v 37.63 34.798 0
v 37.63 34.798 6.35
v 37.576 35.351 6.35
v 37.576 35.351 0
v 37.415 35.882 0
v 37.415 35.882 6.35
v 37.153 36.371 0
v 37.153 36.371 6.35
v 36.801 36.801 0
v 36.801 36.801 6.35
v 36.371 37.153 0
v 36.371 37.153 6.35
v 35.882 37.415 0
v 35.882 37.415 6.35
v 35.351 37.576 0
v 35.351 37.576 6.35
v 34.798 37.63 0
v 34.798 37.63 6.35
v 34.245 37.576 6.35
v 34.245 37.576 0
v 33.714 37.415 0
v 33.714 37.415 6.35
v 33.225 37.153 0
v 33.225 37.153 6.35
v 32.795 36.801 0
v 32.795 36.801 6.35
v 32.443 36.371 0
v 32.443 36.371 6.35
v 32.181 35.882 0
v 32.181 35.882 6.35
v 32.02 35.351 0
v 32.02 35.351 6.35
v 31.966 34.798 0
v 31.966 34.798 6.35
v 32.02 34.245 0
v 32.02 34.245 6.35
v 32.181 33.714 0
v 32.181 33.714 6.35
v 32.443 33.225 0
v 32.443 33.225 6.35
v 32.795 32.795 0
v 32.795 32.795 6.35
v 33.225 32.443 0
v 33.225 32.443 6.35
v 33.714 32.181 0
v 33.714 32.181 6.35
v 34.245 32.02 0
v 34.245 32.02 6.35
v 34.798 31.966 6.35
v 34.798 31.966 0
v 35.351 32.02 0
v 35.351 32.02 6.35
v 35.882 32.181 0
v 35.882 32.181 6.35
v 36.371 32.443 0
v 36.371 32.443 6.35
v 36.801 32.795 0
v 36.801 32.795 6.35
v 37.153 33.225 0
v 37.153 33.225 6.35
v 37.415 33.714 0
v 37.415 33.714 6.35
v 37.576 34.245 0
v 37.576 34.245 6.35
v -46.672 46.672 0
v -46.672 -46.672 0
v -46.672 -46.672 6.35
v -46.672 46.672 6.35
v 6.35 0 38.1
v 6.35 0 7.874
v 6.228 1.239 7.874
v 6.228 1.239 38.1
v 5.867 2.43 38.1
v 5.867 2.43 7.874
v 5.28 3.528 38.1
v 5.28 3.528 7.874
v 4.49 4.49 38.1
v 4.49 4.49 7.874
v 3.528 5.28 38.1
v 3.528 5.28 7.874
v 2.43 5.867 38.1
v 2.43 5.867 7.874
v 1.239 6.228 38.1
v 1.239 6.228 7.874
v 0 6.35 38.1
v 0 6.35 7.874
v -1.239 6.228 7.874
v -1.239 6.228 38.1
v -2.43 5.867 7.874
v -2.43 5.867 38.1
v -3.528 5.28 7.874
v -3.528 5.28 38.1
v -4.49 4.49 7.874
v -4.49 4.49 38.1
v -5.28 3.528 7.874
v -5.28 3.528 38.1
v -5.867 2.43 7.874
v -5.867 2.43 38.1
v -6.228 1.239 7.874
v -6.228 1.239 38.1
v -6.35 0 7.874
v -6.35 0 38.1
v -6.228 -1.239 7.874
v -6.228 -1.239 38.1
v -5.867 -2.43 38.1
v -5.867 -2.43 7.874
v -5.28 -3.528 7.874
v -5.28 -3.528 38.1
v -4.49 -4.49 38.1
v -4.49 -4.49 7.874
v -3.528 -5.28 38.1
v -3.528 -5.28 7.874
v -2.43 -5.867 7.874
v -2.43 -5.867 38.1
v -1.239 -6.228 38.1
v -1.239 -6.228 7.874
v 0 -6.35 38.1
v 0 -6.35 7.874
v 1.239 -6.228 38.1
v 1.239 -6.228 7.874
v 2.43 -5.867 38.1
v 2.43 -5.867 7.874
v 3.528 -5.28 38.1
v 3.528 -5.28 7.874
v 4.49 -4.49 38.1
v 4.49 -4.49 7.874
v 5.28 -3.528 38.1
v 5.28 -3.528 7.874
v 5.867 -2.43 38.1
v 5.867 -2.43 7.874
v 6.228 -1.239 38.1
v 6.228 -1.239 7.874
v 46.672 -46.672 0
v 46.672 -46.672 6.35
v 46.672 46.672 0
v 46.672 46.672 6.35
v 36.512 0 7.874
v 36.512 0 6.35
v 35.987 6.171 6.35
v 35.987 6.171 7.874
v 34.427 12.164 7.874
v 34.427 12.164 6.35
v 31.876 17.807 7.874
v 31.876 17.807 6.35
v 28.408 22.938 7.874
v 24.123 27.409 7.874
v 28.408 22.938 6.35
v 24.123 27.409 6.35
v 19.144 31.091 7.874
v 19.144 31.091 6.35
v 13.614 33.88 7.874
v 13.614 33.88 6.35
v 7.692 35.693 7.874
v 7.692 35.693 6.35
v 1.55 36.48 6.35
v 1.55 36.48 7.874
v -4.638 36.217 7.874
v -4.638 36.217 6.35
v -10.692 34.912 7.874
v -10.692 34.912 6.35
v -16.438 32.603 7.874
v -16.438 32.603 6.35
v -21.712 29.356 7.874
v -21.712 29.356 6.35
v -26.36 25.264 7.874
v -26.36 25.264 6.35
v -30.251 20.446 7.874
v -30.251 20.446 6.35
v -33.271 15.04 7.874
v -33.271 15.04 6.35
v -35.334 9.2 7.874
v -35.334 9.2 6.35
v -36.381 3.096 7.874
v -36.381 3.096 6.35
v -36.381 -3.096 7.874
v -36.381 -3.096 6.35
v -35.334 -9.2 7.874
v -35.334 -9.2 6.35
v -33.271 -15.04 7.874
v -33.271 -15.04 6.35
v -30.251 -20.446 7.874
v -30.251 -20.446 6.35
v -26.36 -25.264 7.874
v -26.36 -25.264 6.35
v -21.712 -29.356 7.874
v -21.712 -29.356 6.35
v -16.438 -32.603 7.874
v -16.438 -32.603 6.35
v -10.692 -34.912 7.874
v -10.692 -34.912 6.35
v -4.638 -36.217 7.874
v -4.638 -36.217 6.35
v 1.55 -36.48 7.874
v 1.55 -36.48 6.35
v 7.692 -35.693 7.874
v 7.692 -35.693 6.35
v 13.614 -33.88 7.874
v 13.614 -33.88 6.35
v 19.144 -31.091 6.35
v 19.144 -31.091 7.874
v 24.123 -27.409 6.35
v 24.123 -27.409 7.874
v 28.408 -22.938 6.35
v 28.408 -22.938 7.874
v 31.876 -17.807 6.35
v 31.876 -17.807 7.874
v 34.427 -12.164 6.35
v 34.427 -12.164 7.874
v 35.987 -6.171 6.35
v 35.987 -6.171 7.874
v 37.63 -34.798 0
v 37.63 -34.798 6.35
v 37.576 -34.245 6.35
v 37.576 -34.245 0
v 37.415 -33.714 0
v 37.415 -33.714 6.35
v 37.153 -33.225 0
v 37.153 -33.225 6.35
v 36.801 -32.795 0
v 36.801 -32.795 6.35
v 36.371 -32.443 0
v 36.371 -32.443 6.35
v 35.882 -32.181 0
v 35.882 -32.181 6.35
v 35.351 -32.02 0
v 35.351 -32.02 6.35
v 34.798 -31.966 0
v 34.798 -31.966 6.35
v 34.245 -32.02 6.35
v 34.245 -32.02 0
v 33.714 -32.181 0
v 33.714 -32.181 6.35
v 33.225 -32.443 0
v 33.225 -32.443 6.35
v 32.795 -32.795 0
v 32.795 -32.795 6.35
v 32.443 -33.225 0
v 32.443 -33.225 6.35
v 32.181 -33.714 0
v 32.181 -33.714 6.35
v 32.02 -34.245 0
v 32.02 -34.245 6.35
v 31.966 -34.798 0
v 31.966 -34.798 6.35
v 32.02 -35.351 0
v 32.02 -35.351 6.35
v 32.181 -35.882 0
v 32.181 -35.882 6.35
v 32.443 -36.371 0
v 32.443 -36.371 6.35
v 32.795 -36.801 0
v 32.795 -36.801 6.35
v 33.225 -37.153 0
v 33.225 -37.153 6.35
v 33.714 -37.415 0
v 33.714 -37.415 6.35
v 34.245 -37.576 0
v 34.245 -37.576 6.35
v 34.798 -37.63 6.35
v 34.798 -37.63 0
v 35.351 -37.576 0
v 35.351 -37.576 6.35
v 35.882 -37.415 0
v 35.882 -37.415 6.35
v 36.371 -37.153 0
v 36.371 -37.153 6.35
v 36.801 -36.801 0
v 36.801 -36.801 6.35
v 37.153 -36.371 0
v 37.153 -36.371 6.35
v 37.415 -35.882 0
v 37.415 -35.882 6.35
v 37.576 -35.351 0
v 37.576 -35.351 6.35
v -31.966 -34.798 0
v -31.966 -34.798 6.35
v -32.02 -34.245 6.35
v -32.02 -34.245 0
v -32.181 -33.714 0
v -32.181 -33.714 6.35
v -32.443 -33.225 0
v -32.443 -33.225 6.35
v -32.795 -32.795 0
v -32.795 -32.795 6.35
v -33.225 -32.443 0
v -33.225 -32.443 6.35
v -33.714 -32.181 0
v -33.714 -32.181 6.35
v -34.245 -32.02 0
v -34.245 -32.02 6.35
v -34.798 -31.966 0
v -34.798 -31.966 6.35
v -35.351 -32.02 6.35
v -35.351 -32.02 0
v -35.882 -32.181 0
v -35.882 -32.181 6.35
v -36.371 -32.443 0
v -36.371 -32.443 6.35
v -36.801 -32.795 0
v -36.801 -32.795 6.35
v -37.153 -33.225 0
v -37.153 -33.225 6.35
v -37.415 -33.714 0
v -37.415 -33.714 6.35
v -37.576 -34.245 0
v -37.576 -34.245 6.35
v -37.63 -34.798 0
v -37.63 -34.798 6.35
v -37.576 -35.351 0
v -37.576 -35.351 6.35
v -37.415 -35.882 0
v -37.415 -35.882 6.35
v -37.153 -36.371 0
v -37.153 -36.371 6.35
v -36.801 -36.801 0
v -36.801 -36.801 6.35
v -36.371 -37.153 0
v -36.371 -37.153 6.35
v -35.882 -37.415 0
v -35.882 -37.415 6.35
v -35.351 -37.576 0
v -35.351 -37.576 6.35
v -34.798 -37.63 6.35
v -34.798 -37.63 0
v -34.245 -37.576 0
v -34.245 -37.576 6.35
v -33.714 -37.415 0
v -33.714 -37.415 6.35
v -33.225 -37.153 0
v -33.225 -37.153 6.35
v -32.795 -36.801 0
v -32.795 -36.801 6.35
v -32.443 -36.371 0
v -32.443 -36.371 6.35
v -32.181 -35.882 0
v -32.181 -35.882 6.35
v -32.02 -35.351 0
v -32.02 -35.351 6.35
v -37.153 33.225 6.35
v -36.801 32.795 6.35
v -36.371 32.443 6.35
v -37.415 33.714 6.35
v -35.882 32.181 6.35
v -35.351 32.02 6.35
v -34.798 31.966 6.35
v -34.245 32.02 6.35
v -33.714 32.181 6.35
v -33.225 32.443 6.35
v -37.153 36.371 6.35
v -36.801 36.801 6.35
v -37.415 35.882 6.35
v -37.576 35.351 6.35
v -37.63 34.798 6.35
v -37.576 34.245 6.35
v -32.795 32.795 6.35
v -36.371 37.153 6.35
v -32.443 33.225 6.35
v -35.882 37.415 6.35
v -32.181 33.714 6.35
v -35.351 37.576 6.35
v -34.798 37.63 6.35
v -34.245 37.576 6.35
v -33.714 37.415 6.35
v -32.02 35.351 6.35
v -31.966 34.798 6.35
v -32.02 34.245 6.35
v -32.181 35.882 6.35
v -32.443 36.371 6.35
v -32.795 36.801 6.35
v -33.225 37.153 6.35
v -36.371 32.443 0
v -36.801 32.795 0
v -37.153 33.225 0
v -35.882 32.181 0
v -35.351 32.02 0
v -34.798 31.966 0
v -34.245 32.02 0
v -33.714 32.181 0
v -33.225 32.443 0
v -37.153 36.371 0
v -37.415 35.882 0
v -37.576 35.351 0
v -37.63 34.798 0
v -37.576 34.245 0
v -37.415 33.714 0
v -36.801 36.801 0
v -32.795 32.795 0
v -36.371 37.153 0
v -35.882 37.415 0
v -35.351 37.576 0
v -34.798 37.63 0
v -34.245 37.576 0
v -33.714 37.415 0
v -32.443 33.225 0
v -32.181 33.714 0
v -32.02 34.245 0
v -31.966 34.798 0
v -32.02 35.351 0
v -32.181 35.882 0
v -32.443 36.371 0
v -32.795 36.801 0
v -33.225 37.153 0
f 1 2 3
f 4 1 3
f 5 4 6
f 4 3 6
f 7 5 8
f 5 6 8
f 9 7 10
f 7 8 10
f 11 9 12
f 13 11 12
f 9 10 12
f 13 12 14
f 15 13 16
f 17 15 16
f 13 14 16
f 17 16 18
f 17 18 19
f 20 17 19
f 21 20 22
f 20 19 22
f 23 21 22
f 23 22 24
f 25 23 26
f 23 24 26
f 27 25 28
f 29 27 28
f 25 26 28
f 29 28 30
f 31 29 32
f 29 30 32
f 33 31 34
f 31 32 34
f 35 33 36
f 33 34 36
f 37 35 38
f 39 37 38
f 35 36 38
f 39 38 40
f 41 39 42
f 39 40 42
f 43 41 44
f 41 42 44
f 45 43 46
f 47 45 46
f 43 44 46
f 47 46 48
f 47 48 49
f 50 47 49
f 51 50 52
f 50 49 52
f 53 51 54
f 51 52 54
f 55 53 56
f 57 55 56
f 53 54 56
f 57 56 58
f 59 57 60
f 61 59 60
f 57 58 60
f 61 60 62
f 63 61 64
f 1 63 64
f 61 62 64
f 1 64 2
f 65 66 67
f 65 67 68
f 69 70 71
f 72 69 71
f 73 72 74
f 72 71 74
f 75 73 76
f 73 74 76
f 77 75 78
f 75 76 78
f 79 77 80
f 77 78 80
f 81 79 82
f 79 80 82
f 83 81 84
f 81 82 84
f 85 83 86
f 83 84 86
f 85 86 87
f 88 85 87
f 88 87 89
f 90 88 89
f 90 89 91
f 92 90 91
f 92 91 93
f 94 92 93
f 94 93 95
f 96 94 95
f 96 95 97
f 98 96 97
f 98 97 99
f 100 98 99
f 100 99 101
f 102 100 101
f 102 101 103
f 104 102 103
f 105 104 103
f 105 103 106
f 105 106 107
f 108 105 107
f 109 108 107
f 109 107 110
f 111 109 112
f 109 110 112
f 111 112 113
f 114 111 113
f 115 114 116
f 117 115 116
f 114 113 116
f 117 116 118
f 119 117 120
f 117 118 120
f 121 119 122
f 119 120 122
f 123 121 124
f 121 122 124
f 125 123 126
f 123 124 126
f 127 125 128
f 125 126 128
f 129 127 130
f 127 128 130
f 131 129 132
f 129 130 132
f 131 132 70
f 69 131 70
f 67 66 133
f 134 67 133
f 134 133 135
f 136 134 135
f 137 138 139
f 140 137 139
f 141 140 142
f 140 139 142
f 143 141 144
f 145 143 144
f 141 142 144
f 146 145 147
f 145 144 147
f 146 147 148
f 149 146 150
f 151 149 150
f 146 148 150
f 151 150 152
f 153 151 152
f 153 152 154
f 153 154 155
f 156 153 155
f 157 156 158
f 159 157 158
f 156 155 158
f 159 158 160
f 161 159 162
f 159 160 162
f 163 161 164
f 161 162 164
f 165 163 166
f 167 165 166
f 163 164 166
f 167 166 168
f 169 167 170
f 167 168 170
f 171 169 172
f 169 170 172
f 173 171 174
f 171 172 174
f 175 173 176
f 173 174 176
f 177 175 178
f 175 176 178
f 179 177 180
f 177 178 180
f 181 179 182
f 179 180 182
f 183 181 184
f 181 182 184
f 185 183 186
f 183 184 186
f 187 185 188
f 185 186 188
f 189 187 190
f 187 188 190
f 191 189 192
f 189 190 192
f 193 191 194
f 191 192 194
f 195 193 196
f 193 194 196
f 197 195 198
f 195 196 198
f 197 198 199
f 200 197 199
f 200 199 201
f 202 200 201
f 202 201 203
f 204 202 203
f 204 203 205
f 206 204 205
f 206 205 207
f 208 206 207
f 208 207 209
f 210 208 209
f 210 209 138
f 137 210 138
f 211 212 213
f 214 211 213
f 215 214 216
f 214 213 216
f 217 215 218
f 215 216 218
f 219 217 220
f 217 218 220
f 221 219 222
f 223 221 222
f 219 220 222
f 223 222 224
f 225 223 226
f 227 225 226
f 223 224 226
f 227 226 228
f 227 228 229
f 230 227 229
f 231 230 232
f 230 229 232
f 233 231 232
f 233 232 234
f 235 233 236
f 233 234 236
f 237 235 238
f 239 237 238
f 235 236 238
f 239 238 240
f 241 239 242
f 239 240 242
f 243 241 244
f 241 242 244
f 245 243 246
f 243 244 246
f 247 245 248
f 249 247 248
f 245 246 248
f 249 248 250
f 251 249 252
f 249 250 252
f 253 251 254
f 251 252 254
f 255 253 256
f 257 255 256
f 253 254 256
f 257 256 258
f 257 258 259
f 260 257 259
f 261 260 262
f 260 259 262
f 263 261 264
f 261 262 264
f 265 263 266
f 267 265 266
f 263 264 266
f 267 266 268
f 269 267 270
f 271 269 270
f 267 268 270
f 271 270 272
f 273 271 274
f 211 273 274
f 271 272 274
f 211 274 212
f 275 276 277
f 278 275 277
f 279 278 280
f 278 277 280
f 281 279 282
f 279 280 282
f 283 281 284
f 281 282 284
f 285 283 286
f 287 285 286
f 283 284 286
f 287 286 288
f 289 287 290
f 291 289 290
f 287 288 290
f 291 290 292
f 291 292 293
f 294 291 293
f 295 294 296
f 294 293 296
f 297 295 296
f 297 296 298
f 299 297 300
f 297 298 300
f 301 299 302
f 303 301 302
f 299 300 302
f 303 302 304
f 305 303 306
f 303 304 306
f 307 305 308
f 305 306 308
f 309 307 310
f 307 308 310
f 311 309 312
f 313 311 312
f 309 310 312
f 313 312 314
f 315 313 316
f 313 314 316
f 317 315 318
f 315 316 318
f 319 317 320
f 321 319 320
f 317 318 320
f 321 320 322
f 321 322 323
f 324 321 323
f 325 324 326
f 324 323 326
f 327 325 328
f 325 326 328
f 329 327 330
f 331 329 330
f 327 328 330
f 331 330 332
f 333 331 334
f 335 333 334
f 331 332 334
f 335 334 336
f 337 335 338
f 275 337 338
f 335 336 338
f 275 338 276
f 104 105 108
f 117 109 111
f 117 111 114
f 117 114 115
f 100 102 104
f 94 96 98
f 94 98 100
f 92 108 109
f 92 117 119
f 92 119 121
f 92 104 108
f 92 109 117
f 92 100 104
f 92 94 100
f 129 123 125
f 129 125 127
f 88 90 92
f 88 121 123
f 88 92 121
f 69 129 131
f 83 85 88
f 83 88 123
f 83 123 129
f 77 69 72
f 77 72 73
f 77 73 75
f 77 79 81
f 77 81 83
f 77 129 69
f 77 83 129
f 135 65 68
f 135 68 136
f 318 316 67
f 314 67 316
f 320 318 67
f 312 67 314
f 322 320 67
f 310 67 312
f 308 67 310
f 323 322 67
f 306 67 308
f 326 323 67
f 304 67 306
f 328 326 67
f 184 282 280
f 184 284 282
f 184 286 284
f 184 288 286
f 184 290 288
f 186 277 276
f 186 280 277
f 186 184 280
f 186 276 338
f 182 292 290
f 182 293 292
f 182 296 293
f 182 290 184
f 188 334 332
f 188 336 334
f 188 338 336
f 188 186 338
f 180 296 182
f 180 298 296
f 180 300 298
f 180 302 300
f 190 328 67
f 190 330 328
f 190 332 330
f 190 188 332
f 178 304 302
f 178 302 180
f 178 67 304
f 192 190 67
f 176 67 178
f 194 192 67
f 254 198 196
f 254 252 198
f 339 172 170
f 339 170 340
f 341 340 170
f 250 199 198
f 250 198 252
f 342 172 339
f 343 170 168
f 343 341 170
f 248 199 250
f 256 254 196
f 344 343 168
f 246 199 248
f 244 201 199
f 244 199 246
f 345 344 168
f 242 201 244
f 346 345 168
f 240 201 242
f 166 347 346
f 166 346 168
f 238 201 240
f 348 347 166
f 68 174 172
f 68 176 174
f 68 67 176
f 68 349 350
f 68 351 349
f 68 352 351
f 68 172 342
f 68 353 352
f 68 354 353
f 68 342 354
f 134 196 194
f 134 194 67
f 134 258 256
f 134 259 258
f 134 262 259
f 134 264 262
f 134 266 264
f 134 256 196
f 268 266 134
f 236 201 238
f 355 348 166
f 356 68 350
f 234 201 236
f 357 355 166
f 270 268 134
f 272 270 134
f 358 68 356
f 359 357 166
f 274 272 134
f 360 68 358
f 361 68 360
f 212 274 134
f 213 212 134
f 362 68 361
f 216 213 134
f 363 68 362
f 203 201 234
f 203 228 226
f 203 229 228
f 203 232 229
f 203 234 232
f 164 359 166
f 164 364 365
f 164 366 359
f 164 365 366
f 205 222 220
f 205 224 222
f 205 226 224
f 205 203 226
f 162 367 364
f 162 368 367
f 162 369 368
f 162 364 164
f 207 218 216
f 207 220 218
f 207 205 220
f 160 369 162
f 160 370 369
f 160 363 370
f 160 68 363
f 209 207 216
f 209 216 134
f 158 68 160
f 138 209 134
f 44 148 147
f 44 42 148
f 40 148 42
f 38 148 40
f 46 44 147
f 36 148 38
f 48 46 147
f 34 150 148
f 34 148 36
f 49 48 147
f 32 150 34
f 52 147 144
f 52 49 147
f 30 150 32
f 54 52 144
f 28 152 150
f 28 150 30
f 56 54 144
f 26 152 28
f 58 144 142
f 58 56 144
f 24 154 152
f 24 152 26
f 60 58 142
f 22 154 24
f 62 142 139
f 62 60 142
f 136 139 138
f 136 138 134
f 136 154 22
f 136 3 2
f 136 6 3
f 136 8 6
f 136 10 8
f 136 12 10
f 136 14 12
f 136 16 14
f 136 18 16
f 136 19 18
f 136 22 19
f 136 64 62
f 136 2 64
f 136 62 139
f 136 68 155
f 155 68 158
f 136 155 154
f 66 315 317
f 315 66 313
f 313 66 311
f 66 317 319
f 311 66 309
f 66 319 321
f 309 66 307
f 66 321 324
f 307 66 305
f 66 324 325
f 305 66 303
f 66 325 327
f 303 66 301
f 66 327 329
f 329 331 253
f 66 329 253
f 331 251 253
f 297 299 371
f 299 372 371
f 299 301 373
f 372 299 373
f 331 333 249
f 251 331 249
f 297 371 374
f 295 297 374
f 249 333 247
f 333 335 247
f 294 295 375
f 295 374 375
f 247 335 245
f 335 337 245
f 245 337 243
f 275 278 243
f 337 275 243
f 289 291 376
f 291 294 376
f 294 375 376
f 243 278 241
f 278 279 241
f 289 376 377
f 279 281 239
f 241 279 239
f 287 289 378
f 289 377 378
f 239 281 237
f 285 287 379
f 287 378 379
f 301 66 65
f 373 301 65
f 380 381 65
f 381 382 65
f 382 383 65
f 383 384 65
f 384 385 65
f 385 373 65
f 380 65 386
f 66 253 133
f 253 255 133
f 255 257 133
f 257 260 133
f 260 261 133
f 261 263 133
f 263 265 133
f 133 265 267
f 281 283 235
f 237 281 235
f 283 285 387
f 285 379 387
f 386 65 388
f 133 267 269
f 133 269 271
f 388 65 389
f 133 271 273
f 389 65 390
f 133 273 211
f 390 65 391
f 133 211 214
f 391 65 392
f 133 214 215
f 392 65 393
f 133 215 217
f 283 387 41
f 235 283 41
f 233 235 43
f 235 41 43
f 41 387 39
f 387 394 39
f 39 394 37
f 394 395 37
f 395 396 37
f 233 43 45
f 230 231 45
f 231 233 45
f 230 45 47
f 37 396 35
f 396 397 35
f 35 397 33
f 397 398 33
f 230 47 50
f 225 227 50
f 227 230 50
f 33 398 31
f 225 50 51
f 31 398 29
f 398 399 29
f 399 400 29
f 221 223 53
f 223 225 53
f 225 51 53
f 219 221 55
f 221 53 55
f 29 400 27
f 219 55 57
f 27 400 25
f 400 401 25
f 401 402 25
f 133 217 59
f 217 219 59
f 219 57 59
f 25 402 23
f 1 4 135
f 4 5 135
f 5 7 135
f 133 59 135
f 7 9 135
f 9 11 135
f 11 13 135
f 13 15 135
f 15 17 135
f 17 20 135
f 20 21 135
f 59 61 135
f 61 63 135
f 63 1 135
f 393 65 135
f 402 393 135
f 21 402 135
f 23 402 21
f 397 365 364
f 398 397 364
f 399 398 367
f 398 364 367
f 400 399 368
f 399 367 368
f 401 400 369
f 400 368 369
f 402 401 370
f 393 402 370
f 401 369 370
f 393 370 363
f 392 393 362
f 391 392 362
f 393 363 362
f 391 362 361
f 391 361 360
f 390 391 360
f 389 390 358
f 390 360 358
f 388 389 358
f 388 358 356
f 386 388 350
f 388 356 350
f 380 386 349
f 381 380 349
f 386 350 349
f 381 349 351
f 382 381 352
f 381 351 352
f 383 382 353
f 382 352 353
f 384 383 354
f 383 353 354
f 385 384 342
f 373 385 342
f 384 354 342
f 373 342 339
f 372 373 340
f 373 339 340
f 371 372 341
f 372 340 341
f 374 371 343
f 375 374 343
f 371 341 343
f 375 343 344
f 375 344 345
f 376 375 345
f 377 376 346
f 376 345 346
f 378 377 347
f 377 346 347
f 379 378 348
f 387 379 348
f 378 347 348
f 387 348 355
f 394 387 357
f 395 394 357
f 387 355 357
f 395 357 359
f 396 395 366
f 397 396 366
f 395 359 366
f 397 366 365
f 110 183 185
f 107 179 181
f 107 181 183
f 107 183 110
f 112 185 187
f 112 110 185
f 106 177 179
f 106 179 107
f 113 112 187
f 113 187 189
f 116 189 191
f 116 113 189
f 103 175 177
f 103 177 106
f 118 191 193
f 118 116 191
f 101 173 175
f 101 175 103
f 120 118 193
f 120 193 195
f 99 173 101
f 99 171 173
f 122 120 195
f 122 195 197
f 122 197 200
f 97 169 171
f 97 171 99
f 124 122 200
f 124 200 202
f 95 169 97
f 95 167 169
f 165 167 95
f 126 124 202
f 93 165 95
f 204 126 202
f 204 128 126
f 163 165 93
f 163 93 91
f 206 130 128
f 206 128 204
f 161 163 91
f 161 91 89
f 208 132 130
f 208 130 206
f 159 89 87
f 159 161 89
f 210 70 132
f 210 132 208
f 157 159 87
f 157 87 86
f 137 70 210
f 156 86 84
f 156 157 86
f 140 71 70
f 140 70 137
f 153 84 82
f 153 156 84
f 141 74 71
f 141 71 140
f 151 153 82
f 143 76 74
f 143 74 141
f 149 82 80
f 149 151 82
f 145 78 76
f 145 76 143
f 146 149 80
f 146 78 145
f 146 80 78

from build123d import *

# Parameters (mm, degrees)
F0_W     = 93.345
F0_H     = 93.345
F1_DEPTH = 6.35
F2_R     = 36.5125
F3_DEPTH = 1.524
F4_R     = 6.35
F5_DEPTH = 31.75
F6_R     = 2.8321
F7_DEPTH = 6.35


with BuildPart() as f1:
    # F0 (on Top) → F1 (new body)
    with BuildSketch(Plane.XY):
        Rectangle(F0_W, F0_H)
    extrude(amount=F1_DEPTH)

    # F2 (on face) → F3 (join)
    with BuildSketch(Plane.XY.offset(6.35)):
        Circle(F2_R)
    extrude(amount=F3_DEPTH)

    # F4 (on face) → F5 (join)
    with BuildSketch(Plane.XY.offset(6.35)):
        Circle(F4_R)
    extrude(amount=F5_DEPTH)

    # F6 (on face) → F7 (cut, through all)
    with BuildSketch(Plane.XY.offset(6.35)):
        with Locations((-34.798, 34.798)):
            Circle(F6_R)
        with Locations((34.798, 34.798)):
            Circle(F6_R)
        with Locations((34.798, -34.798)):
            Circle(F6_R)
        with Locations((-34.798, -34.798)):
            Circle(F6_R)
    extrude(amount=-F7_DEPTH, mode=Mode.SUBTRACT)


solid = f1.part
